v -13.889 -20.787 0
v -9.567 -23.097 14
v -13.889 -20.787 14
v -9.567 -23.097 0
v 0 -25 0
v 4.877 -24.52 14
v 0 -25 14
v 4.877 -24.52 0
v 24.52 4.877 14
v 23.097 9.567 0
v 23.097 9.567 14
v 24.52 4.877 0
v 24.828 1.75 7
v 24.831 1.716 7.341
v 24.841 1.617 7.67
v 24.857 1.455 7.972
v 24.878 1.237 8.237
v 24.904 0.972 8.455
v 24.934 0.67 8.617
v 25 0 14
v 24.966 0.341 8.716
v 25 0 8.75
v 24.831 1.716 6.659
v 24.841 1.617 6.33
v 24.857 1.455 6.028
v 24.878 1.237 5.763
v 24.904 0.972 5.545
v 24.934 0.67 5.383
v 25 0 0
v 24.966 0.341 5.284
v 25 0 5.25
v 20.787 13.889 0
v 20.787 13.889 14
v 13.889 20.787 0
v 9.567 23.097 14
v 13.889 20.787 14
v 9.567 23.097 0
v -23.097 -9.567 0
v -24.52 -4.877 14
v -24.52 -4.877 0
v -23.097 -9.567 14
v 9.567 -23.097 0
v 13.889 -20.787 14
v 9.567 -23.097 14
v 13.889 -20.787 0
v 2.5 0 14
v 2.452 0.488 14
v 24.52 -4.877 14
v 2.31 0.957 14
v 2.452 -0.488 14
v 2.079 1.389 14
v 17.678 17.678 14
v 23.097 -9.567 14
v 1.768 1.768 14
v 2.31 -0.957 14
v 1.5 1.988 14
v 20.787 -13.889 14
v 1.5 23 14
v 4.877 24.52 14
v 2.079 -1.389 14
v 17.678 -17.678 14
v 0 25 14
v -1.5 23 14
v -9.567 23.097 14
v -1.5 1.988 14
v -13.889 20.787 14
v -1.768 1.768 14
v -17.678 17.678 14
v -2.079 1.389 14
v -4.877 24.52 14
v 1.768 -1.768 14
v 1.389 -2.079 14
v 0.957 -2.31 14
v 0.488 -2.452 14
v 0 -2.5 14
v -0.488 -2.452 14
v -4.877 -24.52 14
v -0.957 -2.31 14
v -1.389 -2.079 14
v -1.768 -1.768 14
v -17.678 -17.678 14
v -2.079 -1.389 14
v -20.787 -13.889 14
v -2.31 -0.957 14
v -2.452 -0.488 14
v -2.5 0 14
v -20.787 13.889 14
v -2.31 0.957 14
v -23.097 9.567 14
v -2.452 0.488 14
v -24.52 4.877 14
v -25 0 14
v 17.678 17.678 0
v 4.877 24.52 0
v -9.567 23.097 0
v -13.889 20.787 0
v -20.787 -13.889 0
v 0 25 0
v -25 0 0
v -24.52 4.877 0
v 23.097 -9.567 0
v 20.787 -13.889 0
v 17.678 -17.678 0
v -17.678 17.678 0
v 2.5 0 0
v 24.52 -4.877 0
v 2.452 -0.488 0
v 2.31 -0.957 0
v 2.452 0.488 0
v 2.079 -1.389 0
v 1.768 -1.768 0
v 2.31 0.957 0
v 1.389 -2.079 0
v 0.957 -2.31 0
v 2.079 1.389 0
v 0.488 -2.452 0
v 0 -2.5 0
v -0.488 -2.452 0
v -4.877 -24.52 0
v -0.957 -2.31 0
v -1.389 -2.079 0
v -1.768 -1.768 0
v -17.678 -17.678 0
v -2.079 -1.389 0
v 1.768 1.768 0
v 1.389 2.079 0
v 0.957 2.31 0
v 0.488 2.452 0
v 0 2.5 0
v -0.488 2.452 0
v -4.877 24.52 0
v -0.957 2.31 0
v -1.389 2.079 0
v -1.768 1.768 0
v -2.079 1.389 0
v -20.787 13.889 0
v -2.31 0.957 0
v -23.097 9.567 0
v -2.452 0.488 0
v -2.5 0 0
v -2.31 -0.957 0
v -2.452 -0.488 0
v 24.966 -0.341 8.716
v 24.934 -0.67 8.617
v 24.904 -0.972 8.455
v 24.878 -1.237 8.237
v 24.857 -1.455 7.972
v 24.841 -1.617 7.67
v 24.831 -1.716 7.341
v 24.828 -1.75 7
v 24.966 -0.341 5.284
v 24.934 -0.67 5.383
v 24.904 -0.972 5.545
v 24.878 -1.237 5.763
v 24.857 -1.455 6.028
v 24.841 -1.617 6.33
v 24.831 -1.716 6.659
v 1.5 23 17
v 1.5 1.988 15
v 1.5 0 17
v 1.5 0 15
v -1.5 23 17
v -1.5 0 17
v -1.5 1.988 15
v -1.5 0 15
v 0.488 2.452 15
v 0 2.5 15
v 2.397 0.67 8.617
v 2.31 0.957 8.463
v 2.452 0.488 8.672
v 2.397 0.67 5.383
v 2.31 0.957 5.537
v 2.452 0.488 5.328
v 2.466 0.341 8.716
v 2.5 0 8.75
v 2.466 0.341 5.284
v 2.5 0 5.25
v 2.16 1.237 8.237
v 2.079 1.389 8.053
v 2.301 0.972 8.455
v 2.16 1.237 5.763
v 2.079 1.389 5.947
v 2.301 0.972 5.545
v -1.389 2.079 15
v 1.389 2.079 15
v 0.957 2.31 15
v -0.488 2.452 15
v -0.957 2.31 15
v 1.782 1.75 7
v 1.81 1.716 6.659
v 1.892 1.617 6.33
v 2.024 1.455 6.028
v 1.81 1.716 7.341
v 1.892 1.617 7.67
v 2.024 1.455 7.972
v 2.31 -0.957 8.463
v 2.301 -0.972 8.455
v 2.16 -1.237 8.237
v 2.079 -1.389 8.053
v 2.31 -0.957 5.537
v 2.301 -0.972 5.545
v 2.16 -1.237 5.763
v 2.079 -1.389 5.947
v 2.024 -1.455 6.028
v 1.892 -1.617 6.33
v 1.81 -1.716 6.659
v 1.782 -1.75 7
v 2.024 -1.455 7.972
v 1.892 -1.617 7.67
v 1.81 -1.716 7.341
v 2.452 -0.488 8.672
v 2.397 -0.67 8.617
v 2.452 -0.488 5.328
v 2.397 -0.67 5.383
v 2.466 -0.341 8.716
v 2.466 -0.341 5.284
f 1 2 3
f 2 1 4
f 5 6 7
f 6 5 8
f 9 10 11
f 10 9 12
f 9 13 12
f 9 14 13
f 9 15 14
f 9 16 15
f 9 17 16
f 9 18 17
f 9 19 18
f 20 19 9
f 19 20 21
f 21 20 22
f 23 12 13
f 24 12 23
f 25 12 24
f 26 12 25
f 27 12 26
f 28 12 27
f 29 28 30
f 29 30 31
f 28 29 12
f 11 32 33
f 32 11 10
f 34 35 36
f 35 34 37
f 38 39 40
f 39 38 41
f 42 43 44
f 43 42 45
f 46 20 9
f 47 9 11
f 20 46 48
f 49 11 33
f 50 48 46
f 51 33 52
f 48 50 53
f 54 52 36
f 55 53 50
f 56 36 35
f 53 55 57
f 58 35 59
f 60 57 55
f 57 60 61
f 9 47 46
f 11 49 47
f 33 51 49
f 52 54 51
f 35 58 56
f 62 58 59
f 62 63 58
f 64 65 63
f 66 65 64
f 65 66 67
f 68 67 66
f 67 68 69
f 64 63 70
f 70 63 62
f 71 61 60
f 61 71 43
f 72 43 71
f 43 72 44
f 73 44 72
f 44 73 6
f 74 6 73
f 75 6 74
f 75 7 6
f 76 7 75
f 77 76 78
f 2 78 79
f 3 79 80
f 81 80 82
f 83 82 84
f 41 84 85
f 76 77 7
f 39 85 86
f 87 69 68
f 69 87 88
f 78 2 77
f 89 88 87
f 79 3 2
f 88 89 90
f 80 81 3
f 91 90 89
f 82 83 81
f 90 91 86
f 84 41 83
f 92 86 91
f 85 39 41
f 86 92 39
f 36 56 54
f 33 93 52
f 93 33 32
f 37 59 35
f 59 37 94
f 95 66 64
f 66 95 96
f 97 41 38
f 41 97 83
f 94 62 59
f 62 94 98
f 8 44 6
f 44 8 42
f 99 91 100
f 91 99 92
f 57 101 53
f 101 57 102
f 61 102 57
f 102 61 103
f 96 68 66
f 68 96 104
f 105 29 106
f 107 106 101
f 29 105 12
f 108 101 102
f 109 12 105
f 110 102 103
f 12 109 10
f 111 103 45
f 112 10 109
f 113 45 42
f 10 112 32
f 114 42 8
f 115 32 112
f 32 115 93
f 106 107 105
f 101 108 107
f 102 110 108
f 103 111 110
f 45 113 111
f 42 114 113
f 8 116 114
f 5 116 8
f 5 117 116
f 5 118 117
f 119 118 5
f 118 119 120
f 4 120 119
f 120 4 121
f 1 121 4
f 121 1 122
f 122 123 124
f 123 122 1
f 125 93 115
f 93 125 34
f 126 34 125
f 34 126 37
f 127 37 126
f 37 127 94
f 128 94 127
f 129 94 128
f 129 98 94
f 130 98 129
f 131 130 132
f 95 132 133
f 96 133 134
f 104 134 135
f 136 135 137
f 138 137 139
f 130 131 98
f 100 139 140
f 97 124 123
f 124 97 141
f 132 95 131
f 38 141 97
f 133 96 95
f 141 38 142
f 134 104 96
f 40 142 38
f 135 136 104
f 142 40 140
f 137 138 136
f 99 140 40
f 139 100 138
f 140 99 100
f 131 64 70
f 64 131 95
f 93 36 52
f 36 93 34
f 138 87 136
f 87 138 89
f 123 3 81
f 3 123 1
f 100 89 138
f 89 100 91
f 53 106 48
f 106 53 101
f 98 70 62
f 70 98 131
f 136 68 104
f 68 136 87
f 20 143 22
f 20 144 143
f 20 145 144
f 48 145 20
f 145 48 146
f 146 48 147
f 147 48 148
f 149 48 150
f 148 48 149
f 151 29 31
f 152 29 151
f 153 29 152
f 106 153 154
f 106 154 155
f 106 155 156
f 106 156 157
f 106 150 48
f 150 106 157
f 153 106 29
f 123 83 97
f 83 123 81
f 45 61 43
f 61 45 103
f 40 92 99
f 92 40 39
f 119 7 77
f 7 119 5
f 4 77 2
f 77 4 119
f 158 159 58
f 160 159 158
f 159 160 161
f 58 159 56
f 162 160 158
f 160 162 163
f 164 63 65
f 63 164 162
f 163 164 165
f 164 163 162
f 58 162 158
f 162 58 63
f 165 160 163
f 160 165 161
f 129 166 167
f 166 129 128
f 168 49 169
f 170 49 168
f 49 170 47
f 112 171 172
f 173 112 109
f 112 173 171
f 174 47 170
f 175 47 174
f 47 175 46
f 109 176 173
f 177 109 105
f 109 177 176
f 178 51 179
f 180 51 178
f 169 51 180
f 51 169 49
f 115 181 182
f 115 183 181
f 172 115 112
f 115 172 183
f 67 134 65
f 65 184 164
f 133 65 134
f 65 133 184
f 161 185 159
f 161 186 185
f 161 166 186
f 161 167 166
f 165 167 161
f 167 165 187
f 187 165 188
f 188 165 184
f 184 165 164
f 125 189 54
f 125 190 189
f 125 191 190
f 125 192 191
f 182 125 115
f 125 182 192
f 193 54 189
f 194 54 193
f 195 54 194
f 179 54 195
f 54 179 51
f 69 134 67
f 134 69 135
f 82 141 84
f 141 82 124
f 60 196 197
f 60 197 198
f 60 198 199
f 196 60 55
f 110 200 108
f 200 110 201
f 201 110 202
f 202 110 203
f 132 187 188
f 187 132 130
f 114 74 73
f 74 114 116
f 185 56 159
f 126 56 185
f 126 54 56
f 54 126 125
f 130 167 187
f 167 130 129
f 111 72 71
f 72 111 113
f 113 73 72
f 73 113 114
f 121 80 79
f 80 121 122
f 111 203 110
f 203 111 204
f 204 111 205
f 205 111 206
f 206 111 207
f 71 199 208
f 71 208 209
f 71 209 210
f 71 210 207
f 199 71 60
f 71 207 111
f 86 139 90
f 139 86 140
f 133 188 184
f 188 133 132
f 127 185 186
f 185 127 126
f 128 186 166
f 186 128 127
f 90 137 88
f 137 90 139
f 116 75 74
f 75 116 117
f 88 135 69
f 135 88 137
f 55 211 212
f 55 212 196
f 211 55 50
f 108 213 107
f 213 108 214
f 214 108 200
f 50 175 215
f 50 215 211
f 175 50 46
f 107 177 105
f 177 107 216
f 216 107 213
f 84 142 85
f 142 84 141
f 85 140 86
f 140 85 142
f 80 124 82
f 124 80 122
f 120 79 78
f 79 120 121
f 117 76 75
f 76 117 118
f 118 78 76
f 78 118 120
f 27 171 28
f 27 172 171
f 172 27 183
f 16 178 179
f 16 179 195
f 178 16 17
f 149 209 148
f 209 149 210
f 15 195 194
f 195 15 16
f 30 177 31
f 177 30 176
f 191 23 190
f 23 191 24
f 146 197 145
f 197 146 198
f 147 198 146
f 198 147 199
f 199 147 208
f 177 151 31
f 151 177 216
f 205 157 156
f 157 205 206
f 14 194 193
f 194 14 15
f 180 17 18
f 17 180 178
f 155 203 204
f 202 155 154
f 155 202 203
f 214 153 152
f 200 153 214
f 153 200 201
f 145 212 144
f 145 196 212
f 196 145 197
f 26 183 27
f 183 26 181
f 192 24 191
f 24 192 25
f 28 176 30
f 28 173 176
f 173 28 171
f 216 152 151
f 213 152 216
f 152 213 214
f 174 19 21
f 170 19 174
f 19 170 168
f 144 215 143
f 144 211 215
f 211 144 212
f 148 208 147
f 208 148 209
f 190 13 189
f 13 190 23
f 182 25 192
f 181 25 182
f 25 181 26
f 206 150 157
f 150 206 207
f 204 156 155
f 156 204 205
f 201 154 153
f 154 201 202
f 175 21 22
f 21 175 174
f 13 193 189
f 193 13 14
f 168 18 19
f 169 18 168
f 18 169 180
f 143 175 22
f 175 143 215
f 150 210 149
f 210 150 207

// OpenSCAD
$fn = 32;

// ----------------------------------------------------------------------
// Control knob: pointer knob
// ----------------------------------------------------------------------

// --- parameters (mm) ---
rib_w = 3;                // pointer rib width
rib_h = 4;                // pointer rib height
knob_d = 50;              // knob body diameter
knob_h = 14;              // knob body height
bore_d = 5;               // shaft bore diameter
set_d = 3.5;              // set screw bore diameter

rib_poke = rib_h - 1;  // rib height above the top
total_h = knob_h + rib_h - 1;  // overall height

difference() {
  union() {
    cylinder(h = knob_h, d = knob_d);
    translate([-rib_w / 2, 0, knob_h - 1])
      cube([rib_w, knob_d / 2 - 2, rib_h]);
  }
  translate([0, 0, -1]) cylinder(h = knob_h + 2, d = bore_d);
  translate([-1, 0, knob_h / 2]) rotate([0, 90, 0])
    cylinder(h = knob_d / 2 + bore_d / 2 + 2, d = set_d);}
